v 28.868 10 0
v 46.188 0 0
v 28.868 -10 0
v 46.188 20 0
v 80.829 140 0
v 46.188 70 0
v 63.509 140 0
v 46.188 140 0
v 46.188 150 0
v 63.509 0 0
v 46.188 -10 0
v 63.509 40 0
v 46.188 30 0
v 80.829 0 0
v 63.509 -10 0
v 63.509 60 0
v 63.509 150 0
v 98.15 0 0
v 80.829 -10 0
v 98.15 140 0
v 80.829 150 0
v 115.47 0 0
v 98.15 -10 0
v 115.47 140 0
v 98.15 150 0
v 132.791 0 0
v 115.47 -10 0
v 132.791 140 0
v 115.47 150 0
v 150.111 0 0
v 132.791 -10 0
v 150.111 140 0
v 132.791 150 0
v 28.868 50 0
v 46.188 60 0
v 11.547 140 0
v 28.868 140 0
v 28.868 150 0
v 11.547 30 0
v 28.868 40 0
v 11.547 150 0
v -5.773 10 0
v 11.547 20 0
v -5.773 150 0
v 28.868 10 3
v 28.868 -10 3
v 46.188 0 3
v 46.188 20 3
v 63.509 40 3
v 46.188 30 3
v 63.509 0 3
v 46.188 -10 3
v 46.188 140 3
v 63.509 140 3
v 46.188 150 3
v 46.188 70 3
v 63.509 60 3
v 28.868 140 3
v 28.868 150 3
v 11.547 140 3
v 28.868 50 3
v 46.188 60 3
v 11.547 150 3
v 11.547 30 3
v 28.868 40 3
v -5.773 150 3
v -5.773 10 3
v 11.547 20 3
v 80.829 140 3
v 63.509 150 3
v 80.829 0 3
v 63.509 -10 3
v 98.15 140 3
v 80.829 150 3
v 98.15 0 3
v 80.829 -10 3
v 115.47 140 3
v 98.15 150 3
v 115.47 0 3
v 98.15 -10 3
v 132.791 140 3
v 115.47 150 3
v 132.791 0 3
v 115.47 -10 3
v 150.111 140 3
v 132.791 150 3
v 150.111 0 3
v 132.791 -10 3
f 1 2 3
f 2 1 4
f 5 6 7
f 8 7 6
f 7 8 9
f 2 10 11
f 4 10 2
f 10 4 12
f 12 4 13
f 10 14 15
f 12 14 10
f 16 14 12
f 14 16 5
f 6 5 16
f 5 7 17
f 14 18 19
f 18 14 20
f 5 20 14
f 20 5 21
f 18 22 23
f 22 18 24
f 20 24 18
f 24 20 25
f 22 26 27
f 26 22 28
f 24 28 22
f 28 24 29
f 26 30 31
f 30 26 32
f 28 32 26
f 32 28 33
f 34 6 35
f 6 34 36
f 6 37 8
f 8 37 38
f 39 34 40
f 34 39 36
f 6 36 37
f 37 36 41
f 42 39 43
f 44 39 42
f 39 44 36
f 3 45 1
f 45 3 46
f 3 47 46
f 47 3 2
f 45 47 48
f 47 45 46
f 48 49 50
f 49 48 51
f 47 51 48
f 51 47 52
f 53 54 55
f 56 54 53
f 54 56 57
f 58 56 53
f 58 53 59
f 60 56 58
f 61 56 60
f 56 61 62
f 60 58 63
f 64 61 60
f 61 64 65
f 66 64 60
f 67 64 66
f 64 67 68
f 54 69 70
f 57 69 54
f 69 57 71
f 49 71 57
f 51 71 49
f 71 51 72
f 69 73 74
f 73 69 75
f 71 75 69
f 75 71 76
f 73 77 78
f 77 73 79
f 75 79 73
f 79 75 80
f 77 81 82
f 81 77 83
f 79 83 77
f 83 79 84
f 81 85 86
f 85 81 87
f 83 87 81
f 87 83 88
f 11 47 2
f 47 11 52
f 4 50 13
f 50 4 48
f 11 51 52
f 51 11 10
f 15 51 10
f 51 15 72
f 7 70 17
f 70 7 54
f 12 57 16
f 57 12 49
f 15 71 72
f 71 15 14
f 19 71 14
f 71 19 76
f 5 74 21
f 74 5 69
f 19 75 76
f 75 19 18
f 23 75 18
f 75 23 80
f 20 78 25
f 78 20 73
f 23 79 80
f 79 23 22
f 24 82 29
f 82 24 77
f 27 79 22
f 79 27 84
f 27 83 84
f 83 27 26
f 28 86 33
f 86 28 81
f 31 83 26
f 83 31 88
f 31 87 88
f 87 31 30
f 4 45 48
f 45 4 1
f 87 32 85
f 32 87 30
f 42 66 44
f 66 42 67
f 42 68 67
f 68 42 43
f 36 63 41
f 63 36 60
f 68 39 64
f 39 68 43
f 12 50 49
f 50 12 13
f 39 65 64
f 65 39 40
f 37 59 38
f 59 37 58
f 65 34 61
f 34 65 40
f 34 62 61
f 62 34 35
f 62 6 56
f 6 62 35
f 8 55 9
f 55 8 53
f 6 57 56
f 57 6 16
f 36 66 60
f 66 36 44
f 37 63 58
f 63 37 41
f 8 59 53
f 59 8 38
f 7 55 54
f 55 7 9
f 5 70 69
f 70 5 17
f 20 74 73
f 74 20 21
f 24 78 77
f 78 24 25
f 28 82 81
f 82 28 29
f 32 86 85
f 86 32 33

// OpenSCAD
// file: ../../src/semi_regular/tess_4_8_8.scad
/*
    Tessella: Semi-Regular Tessellation - 4.8.8
    ===========================================
    This module implements the tessellation of a plane using a semi-regular tiling
    pattern defined by the vertex configuration 4.8.8, where one square and two
    octagons meet at each vertex.
*/

include <../tessUtils.scad>;

/**
 * @brief Generates center points for an octagonal grid.
 *
 * Creates a 2D grid of center points for octagons spaced by the octagon's side length.
 *
 * @param radius The radius of each octagon.
 * @param n The number of octagons along the x-axis.
 * @param m The number of octagons along the y-axis.
 * @param rotate (Optional) Boolean to apply rotation to the grid, default is true.
 * @return An array of center points for octagons.
 */
function octagons_centers_rect(
    radius,
    n,
    m
) =
    let (
        side_length = (radius * 2) / (sqrt(4 + 2 * sqrt(2))), // Side length of the octagon
        total_width = side_length * (1 + sqrt(2)) // Total width including spacing
    ) squares_centers_rect(total_width, n, m);

/**
 * @brief Generates center points for the squares in a 4.8.8 tiling grid.
 *
 * Aligns the square centers with the octagonal centers by using a shifted grid,
 * creating the required semi-regular tiling pattern.
 *
 * @param radius The radius of the octagons.
 * @param n The number of octagons along the x-axis.
 * @param m The number of octagons along the y-axis.
 * @return An array of center points for squares.
 */
function squares_8_8_centers_rect(radius, n, m) =
    let (
        side_length = (radius * 2) / (sqrt(4 + 2 * sqrt(2))), // Side length of the octagon
        total_width = side_length * (1 + sqrt(2)), // Total width including spacing
        shift_x = total_width / 2, // Horizontal shift for squares
        shift_y = total_width / 2 // Vertical shift for squares
    ) [for (c = squares_centers_rect(total_width, n - 1, m - 1)) [c[0] + shift_x, c[1] + shift_y]];

/**
 * @brief Generates vertices for octagons based on radius and center points.
 *
 * Generates the vertices for octagons based on the provided center points and radius.
 *
 * @param radius The radius of each octagon.
 * @param centers Array of center points.
 * @param angular_offset (Optional) Rotation angle for vertices, default is 22.5°.
 * @return Array of vertices for each octagon.
 */
function octagons_vertices(radius, centers, angular_offset = 22.5) =
    [
        for (center = centers) [
            for (i = [0:7]) let (
                angle = i * 45 + angular_offset
            ) [center[0] + radius * cos(angle), center[1] + radius * sin(angle)],
        ],
    ];
// file: ../../src/regular/triangles.scad
/*
    Tessella: Regular Tessellation - Triangles
    ==========================================
    This module implements the tessellation of a plane using regular triangles,
    where each tile is congruent, and all vertex angles around a point sum to 360°.

    Polygon properties:
    - Sides: 3
    - Interior Angle: 60°
    - Vertex Configuration: 3.3.3.3.3.3

    Mathematically valid because the interior angle divides 360° exactly.
    Reference: Euclidean tessellation theory for regular polygons.
*/

include <../tessUtils.scad>;

/**
 * @brief Generates center points for a "levels-based" triangle arrangement.
 *
 * Creates a roughly radial or diamond-like pattern of triangle centers. The center row
 * has (2*levels - 1) triangles, each additional row above/below decreases by 1 triangle.
 *
 * @param side   The side length of each equilateral triangle.
 * @param levels Number of levels away from the center row.
 * @return       An array of center points for triangles.
 */
function triangles_centers_radial(side, levels) =
    let (
        // Vertical height of each triangle
        vheight = side * sqrt(3) / 2,
        // Generate rows symmetrically around the center
        rows0 = [
            for (i = [-ceil(levels / 2 - 1):ceil(levels / 2 - 1)])
            let (
                rowCount = (levels - ( (levels + 1) % 2)) - abs(i), // Number of triangles in the row
                yOff = i * vheight, // Vertical offset for the row
                xStart = -(rowCount - 1) * side / 2 // Horizontal start to center the row
            ) [[xStart, yOff], rowCount],
        ],
        rows1 = (levels == 1) ? []
        : [
            for (i = [-(floor(levels / 2)):(floor(levels / 2 - 1))])
            let (
                rowCount = (levels - ( (levels) % 2)) - abs(i), // Number of triangles in the row
                yOff = i * vheight + vheight / 2 - (vheight - sqrt(3) / 3 * side) / 2, // Vertical offset for the row
                xStart = -(rowCount - 1) * side / 2 // Horizontal start to center the row
            ) [[xStart, yOff], rowCount],
        ],
        rows = concat(rows0, rows1)
    )
    // Generate center points for all rows
    [for (row = rows) for (j = [0:row[1] - 1]) [row[0][0] + j * side, row[0][1]]];

/**
 * @brief Generates center points for a rectangular grid of equilateral triangles (n x m).
 *
 * Alternating rows are horizontally offset by half a side for a typical triangular tiling pattern.
 *
 * @param side The side length of each triangle.
 * @param n    Number of triangles along x-axis.
 * @param m    Number of rows (y-axis).
 * @return     An array of center points for triangles.
 */
function triangles_centers_rect(side, n, m) =
    let (
        vheight = side * sqrt(3) / 2, // Vertical height of each triangle
        col_shift = side / 2, // Horizontal shift for each column
        row_shift = vheight, // Horizontal shift for alternating rows
        offset_shift = row_shift - (vheight - sqrt(3) / 3 * side) * 2
    ) [for (j = [0:m - 1], i = [0:n - 1]) [(i) * row_shift + (offset_shift * (j % 2)), j * col_shift]];

/**
 * @brief Generates vertices for equilateral triangles at specified centers.
 *
 * Rotates every other row by 180° and applies an additional angular offset for customization.
 *
 * @param side           The side length of each triangle.
 * @param centers        The array of center points for the triangles.
 * @param angular_offset An additional angular offset to apply to all triangles.
 * @param is_radial      If true, calculates the row index based on radial arrangement.
 * @return               A nested array of vertices for all triangles.
 */
function triangle_vertices(side, centers, angular_offset = 0, rect = true) =
    let (
        EPSILON = 1e-9, // Small value for floating-point comparison
        vheight = side * sqrt(3) / 2, // Vertical height of each triangle
        // This messy line pretty much determines if a row is odd or even based on the vertical position, it needs to check
        // using the reverse calculation of rows1 / offset shift, looking at that now it should probably be refactored.
        // Overall, this works and gets the geometrical idea across, but it's not the most readable (literally horrendous).
        row_parity = [
            for (c = centers) (
                (
                    ( ( ( (rect ? c[0] : c[1]) + EPSILON - vheight / 2 + (vheight - sqrt(3) / 3 * side) / 2) / vheight) % 1) <= EPSILON
                ) && (
                    (
                        ( ( (rect ? c[0] : c[1]) - EPSILON - vheight / 2 + (vheight - sqrt(3) / 3 * side) / 2) / vheight) % 1
                    ) >= -EPSILON
                ) ? 0
                : 1
            ),
        ], // Calculate row parity
        rotation_adjustment = [
            for (i = [0:len(centers) - 1]) (
                row_parity[i] ? (rect ? 0 : 180)
                : (rect ? 180 : 0)
            ),
        ] // Flip every other row
    ) [
            for (i = [0:len(centers) - 1]) [
                for (j = [0:2]) let (
                    angle = j * 120 + angular_offset + rotation_adjustment[i]
                ) [
                        centers[i][0] + side / sqrt(3) * cos(angle),
                        centers[i][1] + side / sqrt(3) * sin(angle),
                ],
            ],
    ];
// file: ../../src/regular/squares.scad
/*
    Tessella: Regular Tessellation - Squares
    ========================================
    This module implements the tessellation of a plane using regular squares,
    where each tile is congruent, and all vertex angles around a point sum to 360°.

    Polygon properties:
    - Sides: 4
    - Interior Angle: 90°
    - Vertex Configuration: 4.4.4.4
*/

include <../tessUtils.scad>;

/**
 * @brief Generates center points for a "levels-based" square arrangement.
 *
 * Creates a diamond-like pattern of square centers. The center (middle) row has (2*levels - 1) squares.
 * Each additional row above or below the center has one fewer square, until only 1 square remains at the
 * top and bottom (when levels > 1).
 *
 * @param side   The side length of each square.
 * @param levels Number of levels (rows above the center, plus the center, plus rows below).
 * @return       An array of center points for squares.
 */
function squares_centers_radial(side, levels) =
    let (
        // Offsets for spacing
        offset_x = side, // Horizontal spacing
        offset_y = side, // Vertical spacing

        // Generate rows from the center outward
        // Row i = -(levels-1) to +(levels-1), where i=0 is the center row.
        rows = [
            for (i = [-(levels - 1):(levels - 1)])
            let (
                rowCount = (2 * levels - 1) - abs(i), // Number of squares in the row
                yOff = i * offset_y, // Vertical position of the row
                xStart = -(rowCount - 1) * offset_x / 2 // Horizontal start to center the row
            ) [[xStart, yOff], rowCount],
        ]
    )
    // For each row definition, generate square center points
    [for (row = rows) for (j = [0:row[1] - 1]) [row[0][0] + j * offset_x, row[0][1]]];

/**
 * @brief Generates center points for a rectangular grid of squares (n x m).
 *
 * Produces a 2D grid of center points spaced by side length in both x and y directions.
 *
 * @param side The side length of each square.
 * @param n    The number of squares along the x-axis.
 * @param m    The number of squares along the y-axis.
 * @return     An array of center points for squares.
 */
function squares_centers_rect(side, n, m) =
    let (offset_x = side, offset_y = side) [for (ix = [0:n - 1], iy = [0:m - 1]) [ix * offset_x, iy * offset_y]];

/**
 * @brief Renders 2D squares at specified centers, with optional color gradient.
 *
 * @param side          The side length of each square.
 * @param spacing       (Optional) Spacing between squares, default is 0.
 * @param centers       (Optional) Array of center points. If empty, `levels` or (n,m) must be provided.
 * @param levels        (Optional) Number of levels for diamond-like pattern generation.
 * @param n, m          (Optional) Grid dimensions if using NxM generation.
 * @param color_scheme  (Optional) Name of the color scheme for gradient.
 * @param alpha         (Optional) Alpha transparency value.
 */

function squares_vertices(side, centers, angular_offset = 45) =
    [
        for (
            center = centers
        ) [
            for (i = [0:3]) let (angle = i * 90 + angular_offset) [
                    center[0] + side / sqrt(2) * cos(angle),
                    center[1] + side / sqrt(2) * sin(angle),
            ],
        ],
    ];
// file: ../../src/regular/hexagons.scad
/*
    Tessella: Regular Tessellation - Hexagons
    =========================================
    Tessellates a plane using regular hexagons.
    Properties:
    - Sides: 6
    - Interior Angle: 120°
    - Vertex Configuration: 6.6.6
*/

include <../tessUtils.scad>;

/**
 * Generates center points for a hexagonal tessellation in a radial pattern.
 * @param radius The radius of each hexagon.
 * @param levels Number of radial levels.
 * @return Array of hexagon center points.
 */
function hexagons_centers_radial(radius, levels) =
    let (
        offset_x = radius * cos(30),
        offset_y = radius + radius * sin(30),
        offset_step = 2 * offset_x,
        dx = -(levels - 1) * offset_x * 2,
        beginning_n = 2 * levels - 1,
        hexagons_pts = function(hex_datum)
        let (
            tx = hex_datum[0][0] + dx,
            ty = hex_datum[0][1],
            n_pts = hex_datum[1],
            offset_xs = [for (i = [0:n_pts - 1]) i * offset_step]
        ) [for (x = offset_xs) [x + tx, ty]],
        upper_hex_data = levels > 1 ? [
                for (i = [1:beginning_n - levels]) let (
                    x = offset_x * i,
                    y = offset_y * i,
                    n_upper = beginning_n - i
                ) [[x, y], n_upper],
            ]
        : [],
        lower_hex_data = levels > 1 ? [for (hex_datum = upper_hex_data) [[hex_datum[0][0], -hex_datum[0][1]], hex_datum[1]]]
        : [],
        total_hex_data = [[[0, 0], beginning_n], each upper_hex_data, each lower_hex_data],
        centers = [for (hex_datum = total_hex_data) hexagons_pts(hex_datum)]
    ) concat([for (c = centers) each c]);

/**
 * Generates center points for a rectangular hexagonal grid.
 * @param radius The radius of each hexagon.
 * @param n Number of hexagons along x-axis.
 * @param m Number of hexagons along y-axis.
 * @return Array of hexagon center points.
 */
function hexagons_centers_rect(radius, n, m) =
    let (
        offset_x = radius * cos(30),
        offset_y = radius + radius * sin(30),
        offset_step = 2 * offset_x
    ) [for (i = [0:n - 1], j = [0:m - 1]) [i * offset_step + (j % 2) * (offset_step / 2), j * offset_y]];

/**
 * Generates vertices for hexagons based on radius and center points.
 * @param radius The radius of each hexagon.
 * @param centers Array of center points.
 * @param angular_offset Rotation angle for vertices.
 * @return Array of vertices for each hexagon.
 */
function hexagons_vertices(radius, centers, angular_offset = 30) =
    [
        for (center = centers) [
            for (i = [0:5]) let (
                angle = i * 60 + angular_offset
            ) [center[0] + radius * cos(angle), center[1] + radius * sin(angle)],
        ],
    ];
// file: ../../src/tessUtils.scad
EPSILON = 1e-3; ///< Tolerance value used for floating-point comparisons.

/**
 * @brief Generates a gradient color based on normalized coordinates and a color scheme.
 *
 * Selects a color by mapping normalized x and y coordinates to RGB values according to the specified color scheme.
 *
 * @param normalized_x The normalized x-coordinate (0 to 1).
 * @param normalized_y The normalized y-coordinate (0 to 1).
 * @param color_scheme The name of the color scheme to use.
 * @return An RGB color array [r, g, b].
 */
function get_gradient_color(normalized_x, normalized_y, color_scheme) =
    color_scheme == "scheme1" ? [normalized_x, 1 - normalized_x, normalized_y]
    : // Red to Blue
    color_scheme == "scheme2" ? [1 - normalized_y, normalized_x, normalized_y]
    : // Green to Magenta
    color_scheme == "scheme3" ? [normalized_y, 1 - normalized_y, normalized_x]
    : // Blue to Yellow
    color_scheme == "scheme4" ? [1 - normalized_x, normalized_x, 1 - normalized_y]
    : // Cyan to Red
    color_scheme == "scheme5" ? [normalized_x, normalized_x * normalized_y, 1 - normalized_x]
    : // Purple to Green
    color_scheme == "scheme6" ? [1 - normalized_x * normalized_y, normalized_y, normalized_x]
    : // Orange to Blue
    [0.9, 0.9, 0.9]; // Default color (grey) if no valid color scheme is provided

/**
 * @brief Renders points as text labels and optional spheres in the 3D space.
 *
 * Displays each point's coordinates as text at its location and optionally places a sphere at the point.
 *
 * @param points An array of points to display, each as [x, y].
 * @param text_size (Optional) Size of the text labels; default is 1.
 * @param color (Optional) Color of the text labels; default is [0.1, 0.1, 0.1].
 * @param pointD (Optional) Diameter of the sphere to place at each point; if undef, no sphere is placed.
 * @param point_color (Optional) Color of the spheres; default is [0.1, 0.1, 0.1].
 * @param fn (Optional) Number of facets for the spheres; default is 8.
 */
module print_points(
    points,
    text_size = 1,
    color = [0.1, 0.1, 0.1],
    pointD = undef,
    point_color = [0.1, 0.1, 0.1],
    fn = 8
) {
    for (point = points) {
        // Translate +1 in Z-axis to avoid z-fighting with the surface
        translate([point[0], point[1] + pointD * 2, pointD * 2]) color(color)
                text(str("[", point[0], ", ", point[1], "]"), size=text_size, valign="center", halign="center");
        if (pointD != undef) {
            // Place a sphere at the point if pointD is specified
            color(point_color) translate([point[0], point[1], 0]) sphere(pointD, $fn=fn);
        }
    }
}

/**
 * @brief Checks if two points are equal within a specified tolerance.
 *
 * @param p1 First point as [x, y].
 * @param p2 Second point as [x, y].
 * @param tolerance (Optional) Tolerance value for comparison; default is EPSILON.
 * @return True if points are equal within tolerance, false otherwise.
 */
function points_equal(p1, p2, tolerance = EPSILON) =
    let (
        comparisons = [
            for (i = [0:len(p1) - 1]) abs(p1[i] - p2[i]) < tolerance,
        ]
    )
    // Check if all comparisons are true
    len([for (comp = comparisons) if (comp) true]) == len(comparisons);

/**
 * @brief Checks if a point exists within a list of points, within a specified tolerance.
 *
 * @param point The point to check, as [x, y].
 * @param list The list of points to search within.
 * @param tolerance (Optional) Tolerance value for comparison; default is EPSILON.
 * @return True if the point exists in the list within tolerance, false otherwise.
 */
function is_point_in_list(
    point,
    list,
    tolerance = EPSILON
) =
    let (equal_points = [for (p = list) points_equal(p, point, tolerance)]) len([for (eq = equal_points) if (eq) true]) > 0;

/**
 * @brief Filters out centers that are present in a filter list.
 *
 * Removes centers from the provided list that match any in the filter_list, within a specified tolerance.
 *
 * @param centers An array of centers to be filtered.
 * @param filter_list An array of centers to filter out.
 * @param tolerance (Optional) Tolerance value for comparison; default is EPSILON.
 * @return A filtered array of centers.
 */
function filter_center_points(centers, filter_list, tolerance = EPSILON) =
    [for (center = centers) if (!is_point_in_list(center, filter_list, tolerance)) center];

/** 
 * @brief Renders a generic polygon shape with optional extrusion and color gradient.
 *
 * This module allows rendering of polygons defined by vertices and paths, with optional extrusion for 3D effects.
 * It supports color gradients based on center points and a specified color scheme.
 *
 * @param vertices An array of vertices for the polygon.    
 * @param paths An array of paths defining the polygon.
 * @param centers (Optional) An array of center points for each polygon, used for color gradient.
 * @param color_scheme (Optional) A string defining the color scheme for the gradient.
 * @param alpha (Optional) Transparency level for the color; default is 1 (opaque).
 * @param extrude (Optional) Height for linear extrusion; if undef, no extrusion is applied.
 * @return Renders the polygon with the specified properties.
 */

module generic_poly(vertices, paths, centers = undef, color_scheme = undef, alpha = 1, extrude = undef) {
    if (!is_undef(color_scheme) && !is_undef(centers)) {
        // Compute normalization bounds
        min_x = min([for (center = centers) center[0]]);
        max_x = max([for (center = centers) center[0]]);
        min_y = min([for (center = centers) center[1]]);
        max_y = max([for (center = centers) center[1]]);

        for (i = [0:len(vertices) - 1]) {
            // Normalize coordinates for color gradient
            normalized_x = (centers[i][0] - min_x) / (max_x - min_x + 1e-9);
            normalized_y = (centers[i][1] - min_y) / (max_y - min_y + 1e-9);

            // Get color value
            color_val = get_gradient_color(normalized_x, normalized_y, color_scheme);

            // Render the shape
            color(color_val, alpha=alpha) if (!is_undef(extrude))
                linear_extrude(height=extrude)
                    polygon(points=vertices[i], paths=paths);
            else
                polygon(points=vertices[i], paths=paths);
        }
    } else {
        for (i = [0:len(vertices) - 1]) {
            // Render the shape without a color gradient
            if (!is_undef(extrude))
                linear_extrude(height=extrude) polygon(points=vertices[i], paths=paths);
            else
                polygon(points=vertices[i], paths=paths);
        }
    }
}
// file: ../../tess.scad
/**
 * @file tess.scad
 * @brief Functions and modules for generating tessellation patterns and rendering shapes.
 * @author Cameron K. Brooks
 * @copyright 2024
 * @info This file serves as an index file to allow for blind importing of all tessellation modules.
 *
 */

// Import utility modules
include <src/tessUtils.scad>

// Import regular tessellation modules

include <src/regular/hexagons.scad>; // Contains hexagon tessellation functions & assets
include <src/regular/squares.scad>; // Contains square tessellation functions & assets
include <src/regular/triangles.scad>; // Contains triangle tessellation functions & assets

// Import semi-regular (Archimedean) tessellation modules
include <src/semi_regular/tess_4_8_8.scad>; // Contains 4.8.8 tessellation functions & octagon assets
// main file
// Rectangular triangles
// Fifteen rows of nine triangles with a zigzag band removed from the left edge to the middle.

use <../../tess.scad>;

side = 20;      // Side length of each triangle
spacing = 0;    // Spacing between triangles
n = 9;          // Number of triangles along the x-axis
m = 15;         // Number of triangles along the y-axis
extHeight = 10; // Extrusion height for triangles

filter = true; // Enable or disable filtering

// WARNING: Printing the center points can be very slow for large grids as they are text-annotated
print_pts = false; // Enable or disable printing of center points

// Generate unfiltered center points
unfiltered_centers = triangles_centers_rect(side, n, m);
echo("Unfiltered Centers Grid:", unfiltered_centers);

// Define filter points for the rectangular tessellation
filter_points_rect = [
    [ 0, 0 ],
    [ 5.7735, 10 ],
    [ 17.3205, 0 ],
    [ 23.094, 10 ],
    [ 17.3205, 20 ],
    [ 34.641, 20 ],
    [ 40.4145, 30 ],
    [ 23.094, 30 ],
    [ 34.641, 40 ],
    [ 40.4145, 50 ],
    [ 51.9615, 40 ],
    [ 57.735, 50 ],
    [ 51.9615, 60 ],
];

// Filter the center points if filtering is enabled
filtered_centers = filter_center_points(unfiltered_centers, filter_points_rect);
echo("Filtered Centers Grid:", filtered_centers);

// Use filtered or unfiltered center points
centers = filter ? filtered_centers : unfiltered_centers;

// Generate vertices for the triangles
vertices = triangle_vertices(side = side - spacing, centers = centers, angular_offset = 0, rect = true);

// Render the triangles
generic_poly(vertices = vertices, paths = [[ 0, 1, 2, 0 ]], // Triangle paths
             centers = centers, color_scheme = "scheme2", alpha = 0.7, extrude = 3);
// Note:
// - The 'centers' parameter is used only for calculating the color scheme.
//   If no color scheme is required, this parameter can be omitted.
// - The 'vertices' parameter is mandatory for defining the geometry of the tessellation.
// - The 'paths' parameter defines the connectivity of vertices to form each shape.
//   For triangles, [[0, 1, 2, 0]] ensures a closed loop connecting three vertices.
// - If a flat 2D visualization is sufficient, the 'extrude' parameter can be omitted:
//   generic_poly(vertices = vertices, paths = [[0, 1, 2, 0]]);

// Render points for debugging
if (print_pts)
{
    translate([ 0, 0, extHeight ])
        print_points(centers, text_size = 1, color = "DarkGrey", pointD = 0.5, point_color = "Orange", fn = 12);
}
